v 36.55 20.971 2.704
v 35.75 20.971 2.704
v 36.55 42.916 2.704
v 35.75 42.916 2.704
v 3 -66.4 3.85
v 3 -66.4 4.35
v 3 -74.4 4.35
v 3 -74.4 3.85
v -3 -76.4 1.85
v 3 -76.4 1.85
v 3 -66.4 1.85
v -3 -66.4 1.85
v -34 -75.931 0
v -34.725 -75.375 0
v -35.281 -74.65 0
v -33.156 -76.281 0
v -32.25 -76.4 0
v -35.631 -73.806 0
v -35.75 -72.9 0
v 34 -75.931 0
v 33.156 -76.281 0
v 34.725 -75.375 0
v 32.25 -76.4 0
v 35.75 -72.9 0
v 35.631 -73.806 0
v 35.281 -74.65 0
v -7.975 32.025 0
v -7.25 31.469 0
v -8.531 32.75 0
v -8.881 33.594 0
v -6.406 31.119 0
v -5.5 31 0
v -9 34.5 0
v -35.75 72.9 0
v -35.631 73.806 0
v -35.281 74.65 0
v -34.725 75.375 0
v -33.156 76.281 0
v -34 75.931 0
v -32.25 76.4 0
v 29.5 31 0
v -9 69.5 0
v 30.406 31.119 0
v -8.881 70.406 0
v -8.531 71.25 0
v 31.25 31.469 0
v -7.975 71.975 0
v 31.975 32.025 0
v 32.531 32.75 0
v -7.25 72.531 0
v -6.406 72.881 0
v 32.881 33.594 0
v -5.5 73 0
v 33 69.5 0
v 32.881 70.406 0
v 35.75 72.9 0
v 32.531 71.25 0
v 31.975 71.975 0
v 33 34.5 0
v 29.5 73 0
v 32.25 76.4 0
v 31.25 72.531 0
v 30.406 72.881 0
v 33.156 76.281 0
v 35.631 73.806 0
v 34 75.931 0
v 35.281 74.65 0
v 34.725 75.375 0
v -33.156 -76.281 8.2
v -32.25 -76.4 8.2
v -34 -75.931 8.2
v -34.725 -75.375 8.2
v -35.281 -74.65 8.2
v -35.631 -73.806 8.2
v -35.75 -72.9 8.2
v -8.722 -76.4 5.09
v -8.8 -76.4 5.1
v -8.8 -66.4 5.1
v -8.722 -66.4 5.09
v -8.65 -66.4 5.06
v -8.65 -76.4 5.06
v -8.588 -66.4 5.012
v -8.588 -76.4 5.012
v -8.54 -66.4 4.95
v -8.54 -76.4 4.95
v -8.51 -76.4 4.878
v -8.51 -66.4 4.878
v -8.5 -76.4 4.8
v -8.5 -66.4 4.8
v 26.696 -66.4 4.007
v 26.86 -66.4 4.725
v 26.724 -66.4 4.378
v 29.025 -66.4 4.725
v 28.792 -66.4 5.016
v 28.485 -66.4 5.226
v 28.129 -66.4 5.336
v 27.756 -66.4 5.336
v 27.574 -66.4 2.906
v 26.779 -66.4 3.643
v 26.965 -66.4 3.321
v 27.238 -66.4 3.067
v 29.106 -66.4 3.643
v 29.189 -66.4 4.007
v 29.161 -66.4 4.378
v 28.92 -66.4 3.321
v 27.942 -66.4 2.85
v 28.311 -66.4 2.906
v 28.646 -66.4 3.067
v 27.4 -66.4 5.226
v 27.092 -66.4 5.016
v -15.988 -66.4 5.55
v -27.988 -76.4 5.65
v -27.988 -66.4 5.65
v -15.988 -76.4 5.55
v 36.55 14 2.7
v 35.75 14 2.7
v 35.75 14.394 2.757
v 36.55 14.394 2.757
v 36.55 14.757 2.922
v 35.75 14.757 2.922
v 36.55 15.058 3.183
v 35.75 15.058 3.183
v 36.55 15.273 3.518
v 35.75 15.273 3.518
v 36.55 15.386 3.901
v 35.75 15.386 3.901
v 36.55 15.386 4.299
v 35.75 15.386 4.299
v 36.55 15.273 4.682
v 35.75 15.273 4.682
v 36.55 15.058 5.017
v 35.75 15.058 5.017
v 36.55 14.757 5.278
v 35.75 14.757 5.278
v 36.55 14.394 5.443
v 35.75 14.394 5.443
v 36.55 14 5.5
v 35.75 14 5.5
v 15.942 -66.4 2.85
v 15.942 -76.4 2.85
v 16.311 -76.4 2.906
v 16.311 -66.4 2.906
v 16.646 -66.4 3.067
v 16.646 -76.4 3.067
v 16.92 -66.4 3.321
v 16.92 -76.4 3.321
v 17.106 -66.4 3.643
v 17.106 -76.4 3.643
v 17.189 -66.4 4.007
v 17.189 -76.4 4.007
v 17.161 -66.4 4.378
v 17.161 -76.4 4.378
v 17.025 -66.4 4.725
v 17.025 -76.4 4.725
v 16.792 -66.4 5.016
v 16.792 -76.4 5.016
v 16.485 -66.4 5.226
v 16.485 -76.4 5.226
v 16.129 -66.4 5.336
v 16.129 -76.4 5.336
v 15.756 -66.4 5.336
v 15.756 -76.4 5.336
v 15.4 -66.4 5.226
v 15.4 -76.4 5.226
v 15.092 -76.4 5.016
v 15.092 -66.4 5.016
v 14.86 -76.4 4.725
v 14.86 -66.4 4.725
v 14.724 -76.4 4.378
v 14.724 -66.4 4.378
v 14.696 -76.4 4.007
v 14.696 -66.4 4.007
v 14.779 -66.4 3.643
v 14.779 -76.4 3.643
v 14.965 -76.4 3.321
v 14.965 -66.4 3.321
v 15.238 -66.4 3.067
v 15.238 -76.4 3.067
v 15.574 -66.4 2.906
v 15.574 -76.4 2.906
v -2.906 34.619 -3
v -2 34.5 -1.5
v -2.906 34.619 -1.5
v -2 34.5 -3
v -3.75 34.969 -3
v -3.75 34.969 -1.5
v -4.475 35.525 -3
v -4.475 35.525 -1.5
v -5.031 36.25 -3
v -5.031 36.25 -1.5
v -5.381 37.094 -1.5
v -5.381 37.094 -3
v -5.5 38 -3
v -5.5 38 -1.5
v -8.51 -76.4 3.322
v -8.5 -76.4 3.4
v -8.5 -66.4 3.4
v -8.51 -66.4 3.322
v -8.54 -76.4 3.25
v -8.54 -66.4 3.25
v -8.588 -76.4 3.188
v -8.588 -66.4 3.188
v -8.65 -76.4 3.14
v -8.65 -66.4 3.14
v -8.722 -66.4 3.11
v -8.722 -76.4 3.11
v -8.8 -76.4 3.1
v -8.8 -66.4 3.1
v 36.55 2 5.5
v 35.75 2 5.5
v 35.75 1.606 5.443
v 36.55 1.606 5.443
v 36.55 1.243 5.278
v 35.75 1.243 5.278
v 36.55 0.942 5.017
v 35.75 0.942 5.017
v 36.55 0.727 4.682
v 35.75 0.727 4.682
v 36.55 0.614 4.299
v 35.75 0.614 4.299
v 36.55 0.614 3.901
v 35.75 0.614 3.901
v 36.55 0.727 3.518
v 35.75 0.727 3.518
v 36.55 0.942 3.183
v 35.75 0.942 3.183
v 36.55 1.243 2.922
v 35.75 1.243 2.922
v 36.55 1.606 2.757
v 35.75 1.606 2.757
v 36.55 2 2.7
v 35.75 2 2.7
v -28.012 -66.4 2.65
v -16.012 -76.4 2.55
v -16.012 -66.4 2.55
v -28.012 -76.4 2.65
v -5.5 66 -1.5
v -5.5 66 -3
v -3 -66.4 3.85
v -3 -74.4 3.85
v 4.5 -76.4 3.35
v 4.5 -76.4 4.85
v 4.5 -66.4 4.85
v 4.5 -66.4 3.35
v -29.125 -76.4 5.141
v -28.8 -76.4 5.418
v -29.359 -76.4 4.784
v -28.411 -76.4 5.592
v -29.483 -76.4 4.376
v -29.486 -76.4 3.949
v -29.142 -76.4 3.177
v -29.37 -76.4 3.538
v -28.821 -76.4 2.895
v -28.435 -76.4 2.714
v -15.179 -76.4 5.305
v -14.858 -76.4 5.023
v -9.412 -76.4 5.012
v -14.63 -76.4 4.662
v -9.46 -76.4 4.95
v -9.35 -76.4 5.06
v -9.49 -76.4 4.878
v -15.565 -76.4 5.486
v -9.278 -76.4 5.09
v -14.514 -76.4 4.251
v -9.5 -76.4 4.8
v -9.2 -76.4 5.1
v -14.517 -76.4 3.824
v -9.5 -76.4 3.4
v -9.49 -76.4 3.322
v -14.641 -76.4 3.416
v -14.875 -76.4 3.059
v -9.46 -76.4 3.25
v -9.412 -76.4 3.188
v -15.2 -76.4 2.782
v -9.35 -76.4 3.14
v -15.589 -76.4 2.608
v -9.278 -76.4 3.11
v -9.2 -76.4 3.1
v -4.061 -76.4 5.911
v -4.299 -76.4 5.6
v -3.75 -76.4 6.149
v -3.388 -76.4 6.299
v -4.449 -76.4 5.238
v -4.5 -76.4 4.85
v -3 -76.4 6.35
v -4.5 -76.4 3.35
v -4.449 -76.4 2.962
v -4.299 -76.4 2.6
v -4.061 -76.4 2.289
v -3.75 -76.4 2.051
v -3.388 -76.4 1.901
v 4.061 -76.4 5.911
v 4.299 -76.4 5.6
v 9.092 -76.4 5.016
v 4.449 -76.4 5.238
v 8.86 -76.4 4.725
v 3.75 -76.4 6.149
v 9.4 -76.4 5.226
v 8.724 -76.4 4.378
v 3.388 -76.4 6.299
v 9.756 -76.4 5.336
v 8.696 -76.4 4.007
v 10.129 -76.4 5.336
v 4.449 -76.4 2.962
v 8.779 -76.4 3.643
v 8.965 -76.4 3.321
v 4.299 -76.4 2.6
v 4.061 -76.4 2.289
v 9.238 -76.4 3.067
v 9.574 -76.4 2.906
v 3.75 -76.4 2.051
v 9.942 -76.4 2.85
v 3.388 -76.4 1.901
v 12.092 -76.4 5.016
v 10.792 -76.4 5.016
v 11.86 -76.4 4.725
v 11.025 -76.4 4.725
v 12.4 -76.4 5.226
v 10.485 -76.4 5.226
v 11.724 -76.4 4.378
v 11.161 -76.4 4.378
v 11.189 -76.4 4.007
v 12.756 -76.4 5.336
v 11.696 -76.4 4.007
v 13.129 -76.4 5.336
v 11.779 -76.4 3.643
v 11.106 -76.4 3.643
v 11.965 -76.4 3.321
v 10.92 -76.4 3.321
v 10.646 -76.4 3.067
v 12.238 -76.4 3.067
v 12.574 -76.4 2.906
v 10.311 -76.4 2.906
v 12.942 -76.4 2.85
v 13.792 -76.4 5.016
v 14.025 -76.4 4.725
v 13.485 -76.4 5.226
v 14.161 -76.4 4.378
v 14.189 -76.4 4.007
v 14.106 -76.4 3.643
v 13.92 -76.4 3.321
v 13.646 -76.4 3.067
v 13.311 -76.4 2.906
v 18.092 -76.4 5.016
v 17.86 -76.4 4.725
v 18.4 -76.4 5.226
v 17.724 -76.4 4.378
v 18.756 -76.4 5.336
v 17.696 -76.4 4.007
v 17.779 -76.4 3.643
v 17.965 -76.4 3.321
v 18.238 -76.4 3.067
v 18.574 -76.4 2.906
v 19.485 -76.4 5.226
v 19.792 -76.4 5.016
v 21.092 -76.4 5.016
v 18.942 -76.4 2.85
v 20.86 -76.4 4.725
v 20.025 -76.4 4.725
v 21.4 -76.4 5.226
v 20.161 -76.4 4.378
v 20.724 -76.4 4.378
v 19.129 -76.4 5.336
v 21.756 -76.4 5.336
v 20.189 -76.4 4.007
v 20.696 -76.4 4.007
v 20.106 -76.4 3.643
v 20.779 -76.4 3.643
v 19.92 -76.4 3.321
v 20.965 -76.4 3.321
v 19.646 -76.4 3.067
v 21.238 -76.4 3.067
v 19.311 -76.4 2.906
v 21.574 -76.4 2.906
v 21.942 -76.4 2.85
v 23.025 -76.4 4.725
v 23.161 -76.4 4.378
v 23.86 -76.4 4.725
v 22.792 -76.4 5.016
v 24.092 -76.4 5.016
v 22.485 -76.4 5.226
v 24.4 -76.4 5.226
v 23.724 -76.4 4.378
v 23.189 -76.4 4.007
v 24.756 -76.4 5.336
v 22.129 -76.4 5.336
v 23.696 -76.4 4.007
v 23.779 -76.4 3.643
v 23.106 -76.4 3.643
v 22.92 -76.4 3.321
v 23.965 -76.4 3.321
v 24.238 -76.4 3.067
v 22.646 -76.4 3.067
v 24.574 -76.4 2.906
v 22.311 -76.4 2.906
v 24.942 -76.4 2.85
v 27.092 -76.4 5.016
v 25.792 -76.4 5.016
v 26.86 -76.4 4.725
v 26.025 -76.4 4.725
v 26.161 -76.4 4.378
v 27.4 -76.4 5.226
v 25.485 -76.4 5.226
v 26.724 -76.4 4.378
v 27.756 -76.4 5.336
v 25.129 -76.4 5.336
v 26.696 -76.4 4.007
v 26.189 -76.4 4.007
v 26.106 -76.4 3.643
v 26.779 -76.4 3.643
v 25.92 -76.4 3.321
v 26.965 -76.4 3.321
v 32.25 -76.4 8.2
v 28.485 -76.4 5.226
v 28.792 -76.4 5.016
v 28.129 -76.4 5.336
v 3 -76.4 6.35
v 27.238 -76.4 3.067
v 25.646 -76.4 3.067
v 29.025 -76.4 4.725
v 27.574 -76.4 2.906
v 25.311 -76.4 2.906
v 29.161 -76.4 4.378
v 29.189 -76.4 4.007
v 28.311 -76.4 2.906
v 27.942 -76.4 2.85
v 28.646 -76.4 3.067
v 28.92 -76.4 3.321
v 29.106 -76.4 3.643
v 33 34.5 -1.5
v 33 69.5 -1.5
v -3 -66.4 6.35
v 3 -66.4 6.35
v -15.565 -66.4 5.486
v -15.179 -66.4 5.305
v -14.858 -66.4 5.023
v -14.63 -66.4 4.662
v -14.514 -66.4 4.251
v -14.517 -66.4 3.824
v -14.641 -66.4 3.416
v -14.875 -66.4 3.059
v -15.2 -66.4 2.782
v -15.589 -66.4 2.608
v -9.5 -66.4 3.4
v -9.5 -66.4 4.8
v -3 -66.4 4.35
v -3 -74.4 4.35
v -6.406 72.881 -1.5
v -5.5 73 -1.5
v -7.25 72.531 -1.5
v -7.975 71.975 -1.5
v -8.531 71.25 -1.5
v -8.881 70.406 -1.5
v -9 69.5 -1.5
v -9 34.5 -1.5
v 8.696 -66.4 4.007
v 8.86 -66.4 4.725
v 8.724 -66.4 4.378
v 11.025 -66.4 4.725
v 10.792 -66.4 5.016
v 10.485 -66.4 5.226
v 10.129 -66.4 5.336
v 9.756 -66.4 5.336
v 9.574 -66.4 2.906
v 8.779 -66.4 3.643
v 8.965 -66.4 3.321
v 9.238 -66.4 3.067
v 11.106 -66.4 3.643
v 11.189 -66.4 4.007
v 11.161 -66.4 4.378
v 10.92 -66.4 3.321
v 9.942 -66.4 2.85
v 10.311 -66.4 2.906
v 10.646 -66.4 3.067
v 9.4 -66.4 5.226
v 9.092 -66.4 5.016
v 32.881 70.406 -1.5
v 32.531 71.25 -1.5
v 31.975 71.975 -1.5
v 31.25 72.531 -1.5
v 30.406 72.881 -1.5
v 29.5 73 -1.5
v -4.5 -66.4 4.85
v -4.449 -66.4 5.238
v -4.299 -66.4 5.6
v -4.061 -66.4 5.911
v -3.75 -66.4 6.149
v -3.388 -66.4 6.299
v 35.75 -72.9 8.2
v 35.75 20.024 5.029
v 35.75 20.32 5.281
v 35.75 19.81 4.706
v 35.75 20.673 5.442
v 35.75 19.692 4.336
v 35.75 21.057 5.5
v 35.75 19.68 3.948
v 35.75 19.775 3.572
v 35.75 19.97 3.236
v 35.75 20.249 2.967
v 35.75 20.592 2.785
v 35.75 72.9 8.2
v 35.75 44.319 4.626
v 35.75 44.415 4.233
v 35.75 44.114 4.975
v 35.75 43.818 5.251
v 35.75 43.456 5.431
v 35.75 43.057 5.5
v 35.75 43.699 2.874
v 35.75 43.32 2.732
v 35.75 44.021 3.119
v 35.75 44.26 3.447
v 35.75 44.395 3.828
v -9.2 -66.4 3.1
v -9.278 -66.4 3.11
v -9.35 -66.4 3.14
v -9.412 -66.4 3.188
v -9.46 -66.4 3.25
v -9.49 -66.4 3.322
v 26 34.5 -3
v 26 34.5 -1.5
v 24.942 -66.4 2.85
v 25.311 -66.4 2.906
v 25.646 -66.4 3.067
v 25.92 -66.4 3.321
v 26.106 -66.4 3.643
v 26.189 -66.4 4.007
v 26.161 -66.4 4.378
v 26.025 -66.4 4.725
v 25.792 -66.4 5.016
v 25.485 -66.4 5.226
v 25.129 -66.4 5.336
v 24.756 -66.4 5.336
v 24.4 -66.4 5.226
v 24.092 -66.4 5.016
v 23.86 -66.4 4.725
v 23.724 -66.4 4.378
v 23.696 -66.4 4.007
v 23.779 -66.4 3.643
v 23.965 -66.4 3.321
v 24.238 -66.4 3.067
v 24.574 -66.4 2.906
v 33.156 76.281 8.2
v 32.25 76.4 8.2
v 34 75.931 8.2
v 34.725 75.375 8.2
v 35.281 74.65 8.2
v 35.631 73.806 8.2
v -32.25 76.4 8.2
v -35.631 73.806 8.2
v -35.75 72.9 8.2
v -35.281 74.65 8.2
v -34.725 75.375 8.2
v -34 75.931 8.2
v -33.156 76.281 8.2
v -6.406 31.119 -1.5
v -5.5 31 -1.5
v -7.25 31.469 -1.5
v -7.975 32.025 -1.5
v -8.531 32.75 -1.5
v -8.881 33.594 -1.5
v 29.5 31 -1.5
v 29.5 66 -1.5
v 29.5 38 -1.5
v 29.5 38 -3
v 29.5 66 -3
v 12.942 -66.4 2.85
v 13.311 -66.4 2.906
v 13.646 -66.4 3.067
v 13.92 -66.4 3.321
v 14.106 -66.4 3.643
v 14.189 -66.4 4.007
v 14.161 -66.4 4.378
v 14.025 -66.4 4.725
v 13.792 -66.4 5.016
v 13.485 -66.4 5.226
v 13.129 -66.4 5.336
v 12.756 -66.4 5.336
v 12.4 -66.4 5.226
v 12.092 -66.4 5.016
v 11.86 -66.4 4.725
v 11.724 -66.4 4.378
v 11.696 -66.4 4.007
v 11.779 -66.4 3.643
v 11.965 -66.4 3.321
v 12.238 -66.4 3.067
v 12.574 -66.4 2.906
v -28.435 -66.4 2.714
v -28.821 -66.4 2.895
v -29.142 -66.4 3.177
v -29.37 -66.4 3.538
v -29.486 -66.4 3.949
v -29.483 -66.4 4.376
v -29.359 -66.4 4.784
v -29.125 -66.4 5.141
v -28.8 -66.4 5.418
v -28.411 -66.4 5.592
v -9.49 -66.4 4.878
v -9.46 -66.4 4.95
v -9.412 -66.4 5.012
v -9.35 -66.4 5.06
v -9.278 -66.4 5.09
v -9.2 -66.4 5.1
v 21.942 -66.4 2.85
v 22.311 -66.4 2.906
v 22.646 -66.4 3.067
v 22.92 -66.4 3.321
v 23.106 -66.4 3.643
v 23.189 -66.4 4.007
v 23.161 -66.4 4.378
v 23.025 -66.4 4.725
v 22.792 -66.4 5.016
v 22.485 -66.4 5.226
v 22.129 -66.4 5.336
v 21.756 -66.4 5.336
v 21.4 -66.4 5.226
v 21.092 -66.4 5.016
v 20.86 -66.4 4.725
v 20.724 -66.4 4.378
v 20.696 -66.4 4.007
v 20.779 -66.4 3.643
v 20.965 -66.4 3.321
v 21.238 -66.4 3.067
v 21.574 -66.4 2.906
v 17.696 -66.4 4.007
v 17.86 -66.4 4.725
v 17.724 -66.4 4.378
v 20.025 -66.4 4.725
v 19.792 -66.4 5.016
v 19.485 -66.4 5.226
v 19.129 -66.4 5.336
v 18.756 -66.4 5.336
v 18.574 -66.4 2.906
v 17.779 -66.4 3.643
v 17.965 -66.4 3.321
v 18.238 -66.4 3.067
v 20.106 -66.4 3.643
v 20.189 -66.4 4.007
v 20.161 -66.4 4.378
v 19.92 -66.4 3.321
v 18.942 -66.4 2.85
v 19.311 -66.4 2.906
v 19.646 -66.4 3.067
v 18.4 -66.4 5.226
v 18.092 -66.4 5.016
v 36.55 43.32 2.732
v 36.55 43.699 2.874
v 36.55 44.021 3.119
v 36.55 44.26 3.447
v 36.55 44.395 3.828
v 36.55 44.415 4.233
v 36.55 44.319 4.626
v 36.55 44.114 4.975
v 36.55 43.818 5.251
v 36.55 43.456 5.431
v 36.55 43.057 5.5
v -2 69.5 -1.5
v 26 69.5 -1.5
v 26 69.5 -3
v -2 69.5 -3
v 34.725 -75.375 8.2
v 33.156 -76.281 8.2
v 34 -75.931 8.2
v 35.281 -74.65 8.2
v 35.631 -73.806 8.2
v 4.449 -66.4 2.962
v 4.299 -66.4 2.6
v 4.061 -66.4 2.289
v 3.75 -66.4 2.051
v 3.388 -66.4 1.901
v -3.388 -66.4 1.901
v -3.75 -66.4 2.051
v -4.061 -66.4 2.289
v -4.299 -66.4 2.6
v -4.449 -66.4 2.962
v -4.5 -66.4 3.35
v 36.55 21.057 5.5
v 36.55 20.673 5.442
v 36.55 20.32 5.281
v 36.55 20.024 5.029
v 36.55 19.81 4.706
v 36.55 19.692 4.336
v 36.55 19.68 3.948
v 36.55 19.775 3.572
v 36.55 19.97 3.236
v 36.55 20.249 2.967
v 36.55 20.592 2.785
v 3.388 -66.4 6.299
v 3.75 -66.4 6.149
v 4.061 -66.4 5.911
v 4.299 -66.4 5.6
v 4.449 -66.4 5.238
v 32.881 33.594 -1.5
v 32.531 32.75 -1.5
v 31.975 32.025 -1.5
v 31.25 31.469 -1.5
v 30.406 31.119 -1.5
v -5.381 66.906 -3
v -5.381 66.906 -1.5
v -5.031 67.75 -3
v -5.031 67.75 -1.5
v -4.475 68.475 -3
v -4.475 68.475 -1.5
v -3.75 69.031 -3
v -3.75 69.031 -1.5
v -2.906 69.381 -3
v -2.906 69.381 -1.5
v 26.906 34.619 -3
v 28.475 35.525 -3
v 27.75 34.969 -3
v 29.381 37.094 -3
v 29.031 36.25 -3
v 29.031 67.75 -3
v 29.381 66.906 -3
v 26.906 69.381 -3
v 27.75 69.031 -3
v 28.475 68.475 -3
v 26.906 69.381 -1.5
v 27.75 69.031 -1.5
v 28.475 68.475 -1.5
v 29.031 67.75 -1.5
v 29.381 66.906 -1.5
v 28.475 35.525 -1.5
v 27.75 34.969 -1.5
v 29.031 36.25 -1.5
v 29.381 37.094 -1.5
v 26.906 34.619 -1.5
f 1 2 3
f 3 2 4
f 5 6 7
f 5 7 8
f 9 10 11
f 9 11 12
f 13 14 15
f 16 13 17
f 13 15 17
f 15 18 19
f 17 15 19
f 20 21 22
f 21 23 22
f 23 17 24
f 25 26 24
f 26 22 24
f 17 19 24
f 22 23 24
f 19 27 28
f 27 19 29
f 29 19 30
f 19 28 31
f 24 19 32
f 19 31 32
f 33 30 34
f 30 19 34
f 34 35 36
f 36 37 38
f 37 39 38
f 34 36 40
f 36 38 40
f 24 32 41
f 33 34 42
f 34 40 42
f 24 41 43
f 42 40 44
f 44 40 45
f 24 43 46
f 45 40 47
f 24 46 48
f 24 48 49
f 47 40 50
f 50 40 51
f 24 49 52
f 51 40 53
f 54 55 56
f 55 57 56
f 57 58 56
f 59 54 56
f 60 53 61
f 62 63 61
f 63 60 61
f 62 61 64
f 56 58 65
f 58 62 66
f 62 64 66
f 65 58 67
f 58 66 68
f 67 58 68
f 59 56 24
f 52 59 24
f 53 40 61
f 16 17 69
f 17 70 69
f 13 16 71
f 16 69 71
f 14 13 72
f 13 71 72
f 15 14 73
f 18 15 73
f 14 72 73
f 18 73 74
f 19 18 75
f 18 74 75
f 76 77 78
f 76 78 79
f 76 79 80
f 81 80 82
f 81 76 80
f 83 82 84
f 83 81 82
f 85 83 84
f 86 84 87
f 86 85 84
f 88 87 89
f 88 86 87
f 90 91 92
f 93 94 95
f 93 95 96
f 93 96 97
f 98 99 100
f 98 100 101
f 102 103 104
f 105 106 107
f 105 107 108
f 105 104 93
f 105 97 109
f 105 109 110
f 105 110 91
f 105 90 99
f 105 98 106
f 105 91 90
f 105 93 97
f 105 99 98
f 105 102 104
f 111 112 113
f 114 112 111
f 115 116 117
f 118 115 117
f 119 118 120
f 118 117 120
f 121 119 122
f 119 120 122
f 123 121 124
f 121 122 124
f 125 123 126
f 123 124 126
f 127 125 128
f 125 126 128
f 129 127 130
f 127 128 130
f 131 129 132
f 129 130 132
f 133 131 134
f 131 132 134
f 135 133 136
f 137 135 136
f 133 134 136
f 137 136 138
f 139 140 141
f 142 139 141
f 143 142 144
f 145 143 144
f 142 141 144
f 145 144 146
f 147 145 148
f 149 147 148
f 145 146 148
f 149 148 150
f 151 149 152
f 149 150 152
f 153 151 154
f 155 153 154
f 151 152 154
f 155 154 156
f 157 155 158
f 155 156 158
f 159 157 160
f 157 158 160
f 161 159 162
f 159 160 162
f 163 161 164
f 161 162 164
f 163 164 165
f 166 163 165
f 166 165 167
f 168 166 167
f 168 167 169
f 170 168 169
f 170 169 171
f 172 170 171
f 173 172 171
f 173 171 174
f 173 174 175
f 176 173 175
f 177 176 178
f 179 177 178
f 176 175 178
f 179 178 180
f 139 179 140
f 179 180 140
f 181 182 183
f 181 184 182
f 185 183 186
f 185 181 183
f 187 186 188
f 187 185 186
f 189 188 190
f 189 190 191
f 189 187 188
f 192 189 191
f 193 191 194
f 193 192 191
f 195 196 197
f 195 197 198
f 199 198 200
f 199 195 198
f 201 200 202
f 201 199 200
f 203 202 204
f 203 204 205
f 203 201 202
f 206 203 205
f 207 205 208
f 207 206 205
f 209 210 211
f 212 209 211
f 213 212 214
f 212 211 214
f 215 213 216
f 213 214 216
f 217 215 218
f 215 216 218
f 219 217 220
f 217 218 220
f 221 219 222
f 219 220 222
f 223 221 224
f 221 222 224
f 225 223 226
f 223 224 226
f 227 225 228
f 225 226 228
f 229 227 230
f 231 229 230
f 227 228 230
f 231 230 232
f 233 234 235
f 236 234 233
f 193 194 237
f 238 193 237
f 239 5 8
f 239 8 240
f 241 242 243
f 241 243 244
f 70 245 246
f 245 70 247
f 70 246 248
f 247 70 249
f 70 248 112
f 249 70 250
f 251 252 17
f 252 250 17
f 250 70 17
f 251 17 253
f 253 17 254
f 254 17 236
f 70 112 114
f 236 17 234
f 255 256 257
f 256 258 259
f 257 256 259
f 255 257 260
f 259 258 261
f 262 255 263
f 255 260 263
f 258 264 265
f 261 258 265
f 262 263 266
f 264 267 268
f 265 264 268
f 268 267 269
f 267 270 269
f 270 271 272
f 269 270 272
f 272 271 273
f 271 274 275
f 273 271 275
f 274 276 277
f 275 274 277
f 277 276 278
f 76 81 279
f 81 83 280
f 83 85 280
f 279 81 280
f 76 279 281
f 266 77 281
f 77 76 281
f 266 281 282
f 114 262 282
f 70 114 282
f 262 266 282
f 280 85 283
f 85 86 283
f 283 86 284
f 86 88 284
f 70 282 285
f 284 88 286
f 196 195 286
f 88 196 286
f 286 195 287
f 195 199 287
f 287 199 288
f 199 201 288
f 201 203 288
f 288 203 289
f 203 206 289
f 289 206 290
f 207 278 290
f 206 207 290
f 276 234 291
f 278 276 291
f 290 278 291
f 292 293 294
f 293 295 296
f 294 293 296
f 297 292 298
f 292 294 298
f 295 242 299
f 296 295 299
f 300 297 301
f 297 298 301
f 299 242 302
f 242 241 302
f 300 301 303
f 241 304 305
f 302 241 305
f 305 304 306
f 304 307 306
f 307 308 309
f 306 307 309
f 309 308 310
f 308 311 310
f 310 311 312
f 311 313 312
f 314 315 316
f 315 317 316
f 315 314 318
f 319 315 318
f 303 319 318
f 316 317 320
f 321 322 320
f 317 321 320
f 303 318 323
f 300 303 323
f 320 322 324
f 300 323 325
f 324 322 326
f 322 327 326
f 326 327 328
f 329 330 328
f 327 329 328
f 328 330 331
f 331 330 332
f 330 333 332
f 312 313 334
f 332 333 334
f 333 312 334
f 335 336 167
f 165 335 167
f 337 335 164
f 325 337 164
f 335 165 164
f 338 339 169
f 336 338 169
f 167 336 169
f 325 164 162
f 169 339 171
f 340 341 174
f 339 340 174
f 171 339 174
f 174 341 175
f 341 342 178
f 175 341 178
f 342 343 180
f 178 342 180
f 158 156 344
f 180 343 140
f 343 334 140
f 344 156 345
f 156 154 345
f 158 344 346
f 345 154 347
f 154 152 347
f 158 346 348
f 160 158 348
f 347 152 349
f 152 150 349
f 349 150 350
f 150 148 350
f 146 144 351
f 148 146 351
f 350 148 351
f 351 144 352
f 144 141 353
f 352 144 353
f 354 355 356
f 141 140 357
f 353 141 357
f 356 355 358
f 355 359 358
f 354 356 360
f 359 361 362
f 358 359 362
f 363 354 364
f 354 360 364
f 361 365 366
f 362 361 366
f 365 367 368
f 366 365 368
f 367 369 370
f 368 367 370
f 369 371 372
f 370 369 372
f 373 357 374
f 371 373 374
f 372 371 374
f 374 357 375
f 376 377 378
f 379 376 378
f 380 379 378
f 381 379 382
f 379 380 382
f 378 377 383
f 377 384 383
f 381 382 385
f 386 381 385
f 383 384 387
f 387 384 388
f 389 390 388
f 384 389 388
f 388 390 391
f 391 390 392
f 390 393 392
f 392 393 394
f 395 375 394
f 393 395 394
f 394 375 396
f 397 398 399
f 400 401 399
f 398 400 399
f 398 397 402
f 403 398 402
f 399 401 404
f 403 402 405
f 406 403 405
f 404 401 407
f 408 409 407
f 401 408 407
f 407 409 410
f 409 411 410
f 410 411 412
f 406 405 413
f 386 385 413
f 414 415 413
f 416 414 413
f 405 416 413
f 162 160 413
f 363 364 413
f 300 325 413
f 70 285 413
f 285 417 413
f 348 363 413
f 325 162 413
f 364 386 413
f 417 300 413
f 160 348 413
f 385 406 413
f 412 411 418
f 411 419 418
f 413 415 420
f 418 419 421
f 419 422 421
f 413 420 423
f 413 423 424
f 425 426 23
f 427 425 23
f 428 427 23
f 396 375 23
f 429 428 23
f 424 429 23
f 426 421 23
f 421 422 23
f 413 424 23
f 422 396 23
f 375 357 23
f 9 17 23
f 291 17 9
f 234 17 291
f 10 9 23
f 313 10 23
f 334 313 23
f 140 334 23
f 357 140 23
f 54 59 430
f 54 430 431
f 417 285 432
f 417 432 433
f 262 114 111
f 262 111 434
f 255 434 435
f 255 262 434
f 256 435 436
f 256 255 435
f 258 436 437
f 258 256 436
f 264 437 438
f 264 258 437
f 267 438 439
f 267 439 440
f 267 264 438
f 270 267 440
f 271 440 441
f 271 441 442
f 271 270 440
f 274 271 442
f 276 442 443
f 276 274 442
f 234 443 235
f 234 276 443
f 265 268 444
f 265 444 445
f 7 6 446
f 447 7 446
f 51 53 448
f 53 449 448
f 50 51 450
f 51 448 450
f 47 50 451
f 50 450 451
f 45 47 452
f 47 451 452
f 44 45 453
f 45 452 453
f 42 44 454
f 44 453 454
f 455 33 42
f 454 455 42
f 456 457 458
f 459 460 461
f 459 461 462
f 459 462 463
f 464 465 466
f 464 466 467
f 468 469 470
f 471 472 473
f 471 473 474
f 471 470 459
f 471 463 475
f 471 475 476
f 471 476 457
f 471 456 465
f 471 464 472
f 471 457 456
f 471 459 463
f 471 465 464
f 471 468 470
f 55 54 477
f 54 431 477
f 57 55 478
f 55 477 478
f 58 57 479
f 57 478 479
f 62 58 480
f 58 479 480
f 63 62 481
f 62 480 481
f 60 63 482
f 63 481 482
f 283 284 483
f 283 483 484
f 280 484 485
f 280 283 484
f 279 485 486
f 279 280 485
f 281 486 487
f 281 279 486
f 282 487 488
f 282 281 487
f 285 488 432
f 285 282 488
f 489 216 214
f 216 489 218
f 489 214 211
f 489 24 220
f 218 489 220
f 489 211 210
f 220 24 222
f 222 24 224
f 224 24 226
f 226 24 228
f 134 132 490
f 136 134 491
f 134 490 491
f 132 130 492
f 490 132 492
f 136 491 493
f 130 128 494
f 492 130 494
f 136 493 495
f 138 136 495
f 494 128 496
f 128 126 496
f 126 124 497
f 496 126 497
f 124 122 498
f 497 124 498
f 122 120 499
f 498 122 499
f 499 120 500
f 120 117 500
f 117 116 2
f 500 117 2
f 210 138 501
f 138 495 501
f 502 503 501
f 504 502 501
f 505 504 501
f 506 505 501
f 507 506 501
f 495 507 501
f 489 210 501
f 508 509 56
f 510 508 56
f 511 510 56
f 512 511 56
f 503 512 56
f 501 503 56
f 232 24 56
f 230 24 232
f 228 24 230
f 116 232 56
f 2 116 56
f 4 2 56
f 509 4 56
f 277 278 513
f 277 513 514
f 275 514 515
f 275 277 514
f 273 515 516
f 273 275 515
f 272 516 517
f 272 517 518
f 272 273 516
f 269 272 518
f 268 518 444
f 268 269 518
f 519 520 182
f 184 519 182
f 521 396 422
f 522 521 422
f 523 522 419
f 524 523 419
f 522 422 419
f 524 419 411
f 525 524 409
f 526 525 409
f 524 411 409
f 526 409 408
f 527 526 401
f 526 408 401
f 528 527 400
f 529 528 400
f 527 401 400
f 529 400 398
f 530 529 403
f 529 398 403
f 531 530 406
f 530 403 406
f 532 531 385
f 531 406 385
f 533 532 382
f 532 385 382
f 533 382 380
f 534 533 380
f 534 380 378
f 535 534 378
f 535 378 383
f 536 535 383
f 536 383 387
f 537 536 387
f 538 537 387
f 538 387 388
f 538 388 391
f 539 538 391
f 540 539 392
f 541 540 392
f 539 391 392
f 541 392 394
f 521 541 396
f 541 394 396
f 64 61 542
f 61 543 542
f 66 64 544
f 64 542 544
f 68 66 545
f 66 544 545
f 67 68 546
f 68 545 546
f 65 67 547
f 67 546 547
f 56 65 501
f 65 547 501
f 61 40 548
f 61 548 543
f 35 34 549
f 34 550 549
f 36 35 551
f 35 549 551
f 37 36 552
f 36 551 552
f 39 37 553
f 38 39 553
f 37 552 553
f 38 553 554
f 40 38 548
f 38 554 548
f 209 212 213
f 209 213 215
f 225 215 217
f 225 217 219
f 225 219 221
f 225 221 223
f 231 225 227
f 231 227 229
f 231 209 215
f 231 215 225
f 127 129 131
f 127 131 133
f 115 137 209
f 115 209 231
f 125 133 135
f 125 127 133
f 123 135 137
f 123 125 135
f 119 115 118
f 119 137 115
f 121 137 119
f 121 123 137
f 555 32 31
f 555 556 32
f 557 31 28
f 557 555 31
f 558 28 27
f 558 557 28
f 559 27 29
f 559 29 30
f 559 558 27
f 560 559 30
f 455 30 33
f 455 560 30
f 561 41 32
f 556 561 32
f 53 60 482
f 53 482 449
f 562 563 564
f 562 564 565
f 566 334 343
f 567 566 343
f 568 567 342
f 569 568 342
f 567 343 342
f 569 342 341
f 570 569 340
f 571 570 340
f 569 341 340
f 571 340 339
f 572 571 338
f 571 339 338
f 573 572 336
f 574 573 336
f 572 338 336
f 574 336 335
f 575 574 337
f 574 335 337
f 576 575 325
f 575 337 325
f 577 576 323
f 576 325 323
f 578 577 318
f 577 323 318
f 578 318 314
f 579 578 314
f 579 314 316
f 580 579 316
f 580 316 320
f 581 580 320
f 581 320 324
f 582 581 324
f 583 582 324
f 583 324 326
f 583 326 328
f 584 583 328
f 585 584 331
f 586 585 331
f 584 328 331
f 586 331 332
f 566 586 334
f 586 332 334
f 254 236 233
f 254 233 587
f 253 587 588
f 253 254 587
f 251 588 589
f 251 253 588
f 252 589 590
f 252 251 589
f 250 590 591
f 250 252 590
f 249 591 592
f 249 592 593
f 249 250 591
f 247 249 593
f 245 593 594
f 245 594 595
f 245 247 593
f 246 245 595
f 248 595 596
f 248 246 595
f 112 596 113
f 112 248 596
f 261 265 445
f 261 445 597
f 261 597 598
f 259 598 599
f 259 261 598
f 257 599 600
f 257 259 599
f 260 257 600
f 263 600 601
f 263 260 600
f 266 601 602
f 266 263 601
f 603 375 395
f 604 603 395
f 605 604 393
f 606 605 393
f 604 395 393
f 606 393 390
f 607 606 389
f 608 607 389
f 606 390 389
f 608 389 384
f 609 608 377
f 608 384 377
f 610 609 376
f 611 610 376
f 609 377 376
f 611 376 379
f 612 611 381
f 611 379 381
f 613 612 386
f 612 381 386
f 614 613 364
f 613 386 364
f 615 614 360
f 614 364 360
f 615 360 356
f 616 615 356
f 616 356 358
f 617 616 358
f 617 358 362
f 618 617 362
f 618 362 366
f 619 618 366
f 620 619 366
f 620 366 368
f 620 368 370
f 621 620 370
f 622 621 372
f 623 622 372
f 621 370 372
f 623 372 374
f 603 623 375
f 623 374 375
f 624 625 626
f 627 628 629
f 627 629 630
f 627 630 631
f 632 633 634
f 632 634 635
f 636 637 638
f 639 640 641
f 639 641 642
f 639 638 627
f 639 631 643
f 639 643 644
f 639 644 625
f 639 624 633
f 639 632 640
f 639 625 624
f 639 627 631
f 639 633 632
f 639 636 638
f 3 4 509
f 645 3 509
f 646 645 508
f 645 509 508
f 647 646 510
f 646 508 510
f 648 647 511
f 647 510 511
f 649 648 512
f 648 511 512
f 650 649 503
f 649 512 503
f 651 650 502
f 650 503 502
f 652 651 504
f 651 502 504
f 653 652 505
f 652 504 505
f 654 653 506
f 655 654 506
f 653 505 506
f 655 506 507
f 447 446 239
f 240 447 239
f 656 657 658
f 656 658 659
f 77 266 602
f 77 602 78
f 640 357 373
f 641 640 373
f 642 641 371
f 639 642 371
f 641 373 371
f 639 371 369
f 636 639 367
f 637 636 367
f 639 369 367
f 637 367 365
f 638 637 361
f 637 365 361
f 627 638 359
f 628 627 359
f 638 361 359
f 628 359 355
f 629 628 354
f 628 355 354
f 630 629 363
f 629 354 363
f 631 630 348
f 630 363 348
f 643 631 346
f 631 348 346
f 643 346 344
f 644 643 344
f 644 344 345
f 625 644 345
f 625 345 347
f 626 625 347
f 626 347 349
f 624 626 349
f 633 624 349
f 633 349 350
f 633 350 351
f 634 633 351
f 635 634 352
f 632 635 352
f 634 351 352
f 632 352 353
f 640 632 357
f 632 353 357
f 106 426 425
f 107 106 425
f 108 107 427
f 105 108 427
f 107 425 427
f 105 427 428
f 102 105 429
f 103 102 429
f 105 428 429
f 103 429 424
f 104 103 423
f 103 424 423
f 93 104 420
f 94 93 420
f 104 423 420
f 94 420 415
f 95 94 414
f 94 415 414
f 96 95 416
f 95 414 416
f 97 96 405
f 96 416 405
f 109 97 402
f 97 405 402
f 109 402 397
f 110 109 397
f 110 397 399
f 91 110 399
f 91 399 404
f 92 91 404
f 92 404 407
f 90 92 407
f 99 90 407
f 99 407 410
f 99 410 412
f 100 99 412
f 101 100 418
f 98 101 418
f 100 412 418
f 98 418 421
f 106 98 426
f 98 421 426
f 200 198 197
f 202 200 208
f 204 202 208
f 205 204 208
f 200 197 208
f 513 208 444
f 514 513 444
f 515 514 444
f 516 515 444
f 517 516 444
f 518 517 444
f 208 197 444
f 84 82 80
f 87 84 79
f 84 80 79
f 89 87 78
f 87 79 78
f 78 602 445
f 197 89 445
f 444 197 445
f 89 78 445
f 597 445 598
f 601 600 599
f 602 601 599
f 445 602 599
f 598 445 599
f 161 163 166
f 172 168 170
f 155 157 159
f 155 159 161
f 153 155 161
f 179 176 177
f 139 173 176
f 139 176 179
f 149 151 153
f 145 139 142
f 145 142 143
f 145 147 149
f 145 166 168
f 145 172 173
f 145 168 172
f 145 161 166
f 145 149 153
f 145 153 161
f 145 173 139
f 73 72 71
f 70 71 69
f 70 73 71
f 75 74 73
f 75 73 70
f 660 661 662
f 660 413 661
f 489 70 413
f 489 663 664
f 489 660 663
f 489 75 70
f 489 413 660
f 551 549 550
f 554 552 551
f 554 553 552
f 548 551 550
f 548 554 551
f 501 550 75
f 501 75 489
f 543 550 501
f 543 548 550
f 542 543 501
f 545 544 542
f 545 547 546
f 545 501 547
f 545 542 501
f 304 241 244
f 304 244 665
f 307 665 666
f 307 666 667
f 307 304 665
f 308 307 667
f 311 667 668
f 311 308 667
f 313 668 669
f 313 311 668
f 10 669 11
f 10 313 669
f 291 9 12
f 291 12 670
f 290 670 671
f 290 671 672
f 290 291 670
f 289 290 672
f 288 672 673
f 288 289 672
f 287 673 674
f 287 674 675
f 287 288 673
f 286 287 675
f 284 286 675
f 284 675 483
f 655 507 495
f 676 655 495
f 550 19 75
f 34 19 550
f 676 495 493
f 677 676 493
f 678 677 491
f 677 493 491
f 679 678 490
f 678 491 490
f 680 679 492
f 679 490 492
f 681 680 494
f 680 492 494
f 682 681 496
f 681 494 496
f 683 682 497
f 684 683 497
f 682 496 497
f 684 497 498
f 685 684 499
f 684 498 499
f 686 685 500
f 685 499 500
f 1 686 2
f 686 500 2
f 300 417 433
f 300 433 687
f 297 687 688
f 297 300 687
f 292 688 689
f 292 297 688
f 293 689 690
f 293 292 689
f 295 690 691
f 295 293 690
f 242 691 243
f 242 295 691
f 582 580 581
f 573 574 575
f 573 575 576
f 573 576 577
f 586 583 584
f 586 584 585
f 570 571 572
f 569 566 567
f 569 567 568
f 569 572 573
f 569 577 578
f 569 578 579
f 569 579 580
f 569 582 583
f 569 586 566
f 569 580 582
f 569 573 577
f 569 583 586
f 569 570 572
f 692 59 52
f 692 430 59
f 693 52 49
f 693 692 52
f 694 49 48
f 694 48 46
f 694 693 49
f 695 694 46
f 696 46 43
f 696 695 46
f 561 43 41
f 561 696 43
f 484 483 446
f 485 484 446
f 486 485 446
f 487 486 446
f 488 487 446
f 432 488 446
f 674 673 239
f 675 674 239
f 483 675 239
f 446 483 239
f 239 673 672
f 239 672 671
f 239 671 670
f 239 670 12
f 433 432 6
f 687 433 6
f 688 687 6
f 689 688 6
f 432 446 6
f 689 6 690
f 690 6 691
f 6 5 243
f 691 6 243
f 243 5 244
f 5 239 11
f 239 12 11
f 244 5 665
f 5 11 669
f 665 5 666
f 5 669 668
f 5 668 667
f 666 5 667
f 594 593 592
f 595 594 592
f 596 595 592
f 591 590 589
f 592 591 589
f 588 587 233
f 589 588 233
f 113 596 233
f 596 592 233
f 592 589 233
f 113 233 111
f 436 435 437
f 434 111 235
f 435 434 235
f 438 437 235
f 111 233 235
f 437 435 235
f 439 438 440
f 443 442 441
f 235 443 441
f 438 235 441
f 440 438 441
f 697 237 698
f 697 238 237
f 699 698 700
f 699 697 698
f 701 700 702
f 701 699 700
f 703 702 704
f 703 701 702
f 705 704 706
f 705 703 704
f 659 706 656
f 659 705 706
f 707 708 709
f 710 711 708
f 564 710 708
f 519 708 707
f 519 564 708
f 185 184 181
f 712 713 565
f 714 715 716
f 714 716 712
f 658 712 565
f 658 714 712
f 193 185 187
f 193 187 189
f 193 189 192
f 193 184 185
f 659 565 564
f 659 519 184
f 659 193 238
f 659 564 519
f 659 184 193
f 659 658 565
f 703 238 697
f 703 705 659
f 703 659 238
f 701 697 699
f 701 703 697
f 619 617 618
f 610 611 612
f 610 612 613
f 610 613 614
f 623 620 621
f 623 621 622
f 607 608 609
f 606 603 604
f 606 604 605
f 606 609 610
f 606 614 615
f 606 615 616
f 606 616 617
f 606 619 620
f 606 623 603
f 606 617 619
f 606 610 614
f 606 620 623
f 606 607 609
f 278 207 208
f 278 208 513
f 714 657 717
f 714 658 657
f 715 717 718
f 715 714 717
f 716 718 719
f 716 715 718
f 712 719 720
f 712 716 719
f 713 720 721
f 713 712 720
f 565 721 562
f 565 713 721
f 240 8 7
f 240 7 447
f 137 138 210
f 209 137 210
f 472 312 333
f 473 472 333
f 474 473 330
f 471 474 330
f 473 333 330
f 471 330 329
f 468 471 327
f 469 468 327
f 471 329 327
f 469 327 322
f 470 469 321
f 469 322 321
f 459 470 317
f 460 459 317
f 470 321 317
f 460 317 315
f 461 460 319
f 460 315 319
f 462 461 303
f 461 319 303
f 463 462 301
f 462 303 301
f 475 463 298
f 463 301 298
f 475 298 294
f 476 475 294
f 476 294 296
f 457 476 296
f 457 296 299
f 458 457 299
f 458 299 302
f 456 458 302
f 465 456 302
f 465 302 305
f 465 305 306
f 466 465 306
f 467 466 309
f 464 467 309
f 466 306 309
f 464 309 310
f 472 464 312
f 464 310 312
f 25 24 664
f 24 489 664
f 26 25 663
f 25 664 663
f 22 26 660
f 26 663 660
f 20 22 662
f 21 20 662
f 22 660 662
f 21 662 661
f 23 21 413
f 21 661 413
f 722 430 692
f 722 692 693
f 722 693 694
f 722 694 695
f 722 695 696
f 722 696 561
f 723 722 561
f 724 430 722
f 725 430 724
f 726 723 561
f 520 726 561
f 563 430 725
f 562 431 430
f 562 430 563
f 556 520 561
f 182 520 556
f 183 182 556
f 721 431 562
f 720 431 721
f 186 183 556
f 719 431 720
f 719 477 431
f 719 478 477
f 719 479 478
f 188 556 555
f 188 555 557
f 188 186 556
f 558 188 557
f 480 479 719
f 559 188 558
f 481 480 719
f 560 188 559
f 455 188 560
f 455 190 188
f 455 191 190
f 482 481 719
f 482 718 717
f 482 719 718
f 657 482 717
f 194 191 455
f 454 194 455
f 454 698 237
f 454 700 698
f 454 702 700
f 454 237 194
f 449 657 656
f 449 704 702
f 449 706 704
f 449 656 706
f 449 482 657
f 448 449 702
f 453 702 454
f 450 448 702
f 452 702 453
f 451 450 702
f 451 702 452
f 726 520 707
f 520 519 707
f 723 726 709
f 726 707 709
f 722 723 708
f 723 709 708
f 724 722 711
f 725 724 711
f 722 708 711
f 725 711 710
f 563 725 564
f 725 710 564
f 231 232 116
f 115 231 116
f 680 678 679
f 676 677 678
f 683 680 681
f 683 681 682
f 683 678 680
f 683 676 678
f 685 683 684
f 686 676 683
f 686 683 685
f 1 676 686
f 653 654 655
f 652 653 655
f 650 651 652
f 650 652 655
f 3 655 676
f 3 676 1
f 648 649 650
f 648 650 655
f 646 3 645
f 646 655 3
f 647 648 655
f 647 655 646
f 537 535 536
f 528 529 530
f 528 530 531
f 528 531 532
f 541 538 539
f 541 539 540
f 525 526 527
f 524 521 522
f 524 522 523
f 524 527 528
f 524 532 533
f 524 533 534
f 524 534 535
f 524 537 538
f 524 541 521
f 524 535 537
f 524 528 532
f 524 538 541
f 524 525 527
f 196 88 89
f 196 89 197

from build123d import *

# Parameters (mm, degrees)
SKETCH_1_W          = 71.5
SKETCH_1_H          = 152.8
EXTRUDE_1_DEPTH     = 8.2
FILLET_3_R          = 3.5
FILLET_4_R          = 3.5
FILLET_5_R          = 3.5
FILLET_6_R          = 3.5
EXTRUDE_3_DEPTH     = 0.8
EXTRUDE_4_DEPTH     = 0.8
SKETCH_5_W          = 42
SKETCH_5_H          = 42
EXTRUDE_5_DEPTH     = 1.5
FILLET_10_R         = 3.5
FILLET_11_R         = 3.5
FILLET_12_R         = 3.5
FILLET_13_R         = 3.5
CUT_EXTRUDE_1_DEPTH = 10
SKETCH_7_W          = 6
SKETCH_7_H          = 0.5
EXTRUDE_6_DEPTH     = 8
SKETCH_8_R          = 1.25
CUT_EXTRUDE_2_DEPTH = 10
CUT_EXTRUDE_3_DEPTH = 10
SKETCH_13_W         = 35
SKETCH_13_H         = 35
EXTRUDE_7_DEPTH     = 1.5
FILLET_14_R         = 3.5
CUT_EXTRUDE_4_DEPTH = 10


with BuildPart() as part:
    # 草图1 → 凸台-拉伸1 (new body)
    with BuildSketch(Plane.XY):
        Rectangle(SKETCH_1_W, SKETCH_1_H)
    extrude(amount=EXTRUDE_1_DEPTH)

    # 圆角3
    fillet_3_edges = [part.edges().sort_by_distance(p)[0] for p in [
        (-35.75, 76.4, 4.1),
    ]]
    fillet(fillet_3_edges, radius=FILLET_3_R)

    # 圆角4
    fillet_4_edges = [part.edges().sort_by_distance(p)[0] for p in [
        (35.75, 76.4, 4.1),
    ]]
    fillet(fillet_4_edges, radius=FILLET_4_R)

    # 圆角5
    fillet_5_edges = [part.edges().sort_by_distance(p)[0] for p in [
        (35.75, -76.4, 4.1),
    ]]
    fillet(fillet_5_edges, radius=FILLET_5_R)

    # 圆角6
    fillet_6_edges = [part.edges().sort_by_distance(p)[0] for p in [
        (-35.75, -76.4, 4.1),
    ]]
    fillet(fillet_6_edges, radius=FILLET_6_R)

    # 草图3 → 凸台-拉伸3 (add)
    with BuildSketch(Plane(origin=(35.75, 0, 0), x_dir=(0, 0, -1), z_dir=(1, 0, 0))):
        with BuildLine():
            Line((-5.499995889, 43.056517333), (-5.499995889, 21.056517333))
            ThreePointArc((-5.499995889, 21.056517333), (-4.142644, 19.672279908), (-2.703526658, 20.971302108))
            Line((-2.703526658, 20.971302108), (-2.703526658, 42.915947634))
            ThreePointArc((-2.703526658, 42.915947634), (-4.029693086, 44.419944517), (-5.499995889, 43.056517333))
        make_face()
    extrude(amount=EXTRUDE_3_DEPTH)

    # 草图4 → 凸台-拉伸4 (add)
    with BuildSketch(Plane(origin=(35.75, 0, 0), x_dir=(0, 0, -1), z_dir=(1, 0, 0))):
        with BuildLine():
            Line((-5.5, 14), (-5.5, 2))
            ThreePointArc((-5.5, 2), (-4.1, 0.6), (-2.7, 2))
            Line((-2.7, 2), (-2.7, 14))
            ThreePointArc((-2.7, 14), (-4.1, 15.4), (-5.5, 14))
        make_face()
    extrude(amount=EXTRUDE_4_DEPTH)

    # 草图5 → 凸台-拉伸5 (add)
    with BuildSketch(Plane(origin=(0, 0, 0), x_dir=(-1, 0, 0), z_dir=(0, 0, -1))):
        with Locations((-12, 52)):
            Rectangle(SKETCH_5_W, SKETCH_5_H)
    extrude(amount=EXTRUDE_5_DEPTH)

    # 圆角10
    fillet_10_edges = [part.edges().sort_by_distance(p)[0] for p in [
        (33, 73, -0.75),
    ]]
    fillet(fillet_10_edges, radius=FILLET_10_R)

    # 圆角11
    fillet_11_edges = [part.edges().sort_by_distance(p)[0] for p in [
        (-9, 73, -0.75),
    ]]
    fillet(fillet_11_edges, radius=FILLET_11_R)

    # 圆角12
    fillet_12_edges = [part.edges().sort_by_distance(p)[0] for p in [
        (33, 31, -0.75),
    ]]
    fillet(fillet_12_edges, radius=FILLET_12_R)

    # 圆角13
    fillet_13_edges = [part.edges().sort_by_distance(p)[0] for p in [
        (-9, 31, -0.75),
    ]]
    fillet(fillet_13_edges, radius=FILLET_13_R)

    # 草图6 → 切除-拉伸1 (cut)
    with BuildSketch(Plane(origin=(0, -76.4, 0), x_dir=(-1, 0, 0), z_dir=(0, -1, 0))):
        with BuildLine():
            Line((3, -6.35), (-3, -6.35))
            ThreePointArc((-3, -6.35), (-4.060660172, -5.910660172), (-4.5, -4.85))
            Line((-4.5, -4.85), (-4.5, -3.35))
            ThreePointArc((-4.5, -3.35), (-4.060660172, -2.289339828), (-3, -1.85))
            Line((-3, -1.85), (3, -1.85))
            ThreePointArc((3, -1.85), (4.060660172, -2.289339828), (4.5, -3.35))
            Line((4.5, -3.35), (4.5, -4.85))
            ThreePointArc((4.5, -4.85), (4.060660172, -5.910660172), (3, -6.35))
        make_face()
    extrude(amount=-CUT_EXTRUDE_1_DEPTH, mode=Mode.SUBTRACT)

    # 草图7 → 凸台-拉伸6 (add)
    with BuildSketch(Plane(origin=(0, -66.4, 0), x_dir=(-1, 0, 0), z_dir=(0, -1, 0))):
        with Locations((0, -4.1)):
            Rectangle(SKETCH_7_W, SKETCH_7_H)
    extrude(amount=EXTRUDE_6_DEPTH)

    # 草图8 → 切除-拉伸2 (cut)
    with BuildSketch(Plane(origin=(0, -76.4, 0), x_dir=(-1, 0, 0), z_dir=(0, -1, 0))):
        with Locations(Location((-9.942250917, -4.1, 0), (0, 0, 90))):
            Circle(SKETCH_8_R)
        with Locations(Location((-12.942250917, -4.1, 0), (0, 0, 90))):
            Circle(SKETCH_8_R)
        with Locations(Location((-15.942250917, -4.1, 0), (0, 0, 90))):
            Circle(SKETCH_8_R)
        with Locations(Location((-18.942250917, -4.1, 0), (0, 0, 90))):
            Circle(SKETCH_8_R)
        with Locations(Location((-21.942250917, -4.1, 0), (0, 0, 90))):
            Circle(SKETCH_8_R)
        with Locations(Location((-24.942250917, -4.1, 0), (0, 0, 90))):
            Circle(SKETCH_8_R)
        with Locations(Location((-27.942250917, -4.1, 0), (0, 0, 90))):
            Circle(SKETCH_8_R)
    extrude(amount=-CUT_EXTRUDE_2_DEPTH, mode=Mode.SUBTRACT)

    # 草图11 → 切除-拉伸3 (cut)
    with BuildSketch(Plane.XZ.offset(76.4)):
        with BuildLine():
            Line((-9.2, 5.1), (-8.8, 5.1))
            ThreePointArc((-8.8, 5.1), (-8.587867966, 5.012132034), (-8.5, 4.8))
            Line((-8.5, 4.8), (-8.5, 3.4))
            ThreePointArc((-8.5, 3.4), (-8.587867966, 3.187867966), (-8.8, 3.1))
            Line((-8.8, 3.1), (-9.2, 3.1))
            ThreePointArc((-9.2, 3.1), (-9.412132034, 3.187867966), (-9.5, 3.4))
            Line((-9.5, 3.4), (-9.5, 4.8))
            ThreePointArc((-9.5, 4.8), (-9.412132034, 5.012132034), (-9.2, 5.1))
        make_face()
    extrude(amount=-CUT_EXTRUDE_3_DEPTH, mode=Mode.SUBTRACT)

    # 草图13 → 凸台-拉伸7 (add)
    with BuildSketch(Plane(origin=(0, 0, -1.5), x_dir=(-1, 0, 0), z_dir=(0, 0, -1))):
        with Locations((-12, 52)):
            Rectangle(SKETCH_13_W, SKETCH_13_H)
    extrude(amount=EXTRUDE_7_DEPTH)

    # 圆角14
    fillet_14_edges = [part.edges().sort_by_distance(p)[0] for p in [
        (-5.5, 34.5, -2.25),
        (-5.5, 69.5, -2.25),
        (29.5, 69.5, -2.25),
        (29.5, 34.5, -2.25),
    ]]
    fillet(fillet_14_edges, radius=FILLET_14_R)

    # 草图14 → 切除-拉伸4 (cut)
    with BuildSketch(Plane(origin=(0, -76.4, 0), x_dir=(-1, 0, 0), z_dir=(0, -1, 0))):
        with BuildLine():
            Line((16.012447704, -2.550259118), (28.012447704, -2.64984418))
            ThreePointArc((28.012447704, -2.64984418), (29.499948351, -4.162240235), (27.987552296, -5.649740882))
            Line((27.987552296, -5.649740882), (15.987552296, -5.55015582))
            ThreePointArc((15.987552296, -5.55015582), (14.500051649, -4.037759765), (16.012447704, -2.550259118))
        make_face()
    extrude(amount=-CUT_EXTRUDE_4_DEPTH, mode=Mode.SUBTRACT)


solid = part.part
